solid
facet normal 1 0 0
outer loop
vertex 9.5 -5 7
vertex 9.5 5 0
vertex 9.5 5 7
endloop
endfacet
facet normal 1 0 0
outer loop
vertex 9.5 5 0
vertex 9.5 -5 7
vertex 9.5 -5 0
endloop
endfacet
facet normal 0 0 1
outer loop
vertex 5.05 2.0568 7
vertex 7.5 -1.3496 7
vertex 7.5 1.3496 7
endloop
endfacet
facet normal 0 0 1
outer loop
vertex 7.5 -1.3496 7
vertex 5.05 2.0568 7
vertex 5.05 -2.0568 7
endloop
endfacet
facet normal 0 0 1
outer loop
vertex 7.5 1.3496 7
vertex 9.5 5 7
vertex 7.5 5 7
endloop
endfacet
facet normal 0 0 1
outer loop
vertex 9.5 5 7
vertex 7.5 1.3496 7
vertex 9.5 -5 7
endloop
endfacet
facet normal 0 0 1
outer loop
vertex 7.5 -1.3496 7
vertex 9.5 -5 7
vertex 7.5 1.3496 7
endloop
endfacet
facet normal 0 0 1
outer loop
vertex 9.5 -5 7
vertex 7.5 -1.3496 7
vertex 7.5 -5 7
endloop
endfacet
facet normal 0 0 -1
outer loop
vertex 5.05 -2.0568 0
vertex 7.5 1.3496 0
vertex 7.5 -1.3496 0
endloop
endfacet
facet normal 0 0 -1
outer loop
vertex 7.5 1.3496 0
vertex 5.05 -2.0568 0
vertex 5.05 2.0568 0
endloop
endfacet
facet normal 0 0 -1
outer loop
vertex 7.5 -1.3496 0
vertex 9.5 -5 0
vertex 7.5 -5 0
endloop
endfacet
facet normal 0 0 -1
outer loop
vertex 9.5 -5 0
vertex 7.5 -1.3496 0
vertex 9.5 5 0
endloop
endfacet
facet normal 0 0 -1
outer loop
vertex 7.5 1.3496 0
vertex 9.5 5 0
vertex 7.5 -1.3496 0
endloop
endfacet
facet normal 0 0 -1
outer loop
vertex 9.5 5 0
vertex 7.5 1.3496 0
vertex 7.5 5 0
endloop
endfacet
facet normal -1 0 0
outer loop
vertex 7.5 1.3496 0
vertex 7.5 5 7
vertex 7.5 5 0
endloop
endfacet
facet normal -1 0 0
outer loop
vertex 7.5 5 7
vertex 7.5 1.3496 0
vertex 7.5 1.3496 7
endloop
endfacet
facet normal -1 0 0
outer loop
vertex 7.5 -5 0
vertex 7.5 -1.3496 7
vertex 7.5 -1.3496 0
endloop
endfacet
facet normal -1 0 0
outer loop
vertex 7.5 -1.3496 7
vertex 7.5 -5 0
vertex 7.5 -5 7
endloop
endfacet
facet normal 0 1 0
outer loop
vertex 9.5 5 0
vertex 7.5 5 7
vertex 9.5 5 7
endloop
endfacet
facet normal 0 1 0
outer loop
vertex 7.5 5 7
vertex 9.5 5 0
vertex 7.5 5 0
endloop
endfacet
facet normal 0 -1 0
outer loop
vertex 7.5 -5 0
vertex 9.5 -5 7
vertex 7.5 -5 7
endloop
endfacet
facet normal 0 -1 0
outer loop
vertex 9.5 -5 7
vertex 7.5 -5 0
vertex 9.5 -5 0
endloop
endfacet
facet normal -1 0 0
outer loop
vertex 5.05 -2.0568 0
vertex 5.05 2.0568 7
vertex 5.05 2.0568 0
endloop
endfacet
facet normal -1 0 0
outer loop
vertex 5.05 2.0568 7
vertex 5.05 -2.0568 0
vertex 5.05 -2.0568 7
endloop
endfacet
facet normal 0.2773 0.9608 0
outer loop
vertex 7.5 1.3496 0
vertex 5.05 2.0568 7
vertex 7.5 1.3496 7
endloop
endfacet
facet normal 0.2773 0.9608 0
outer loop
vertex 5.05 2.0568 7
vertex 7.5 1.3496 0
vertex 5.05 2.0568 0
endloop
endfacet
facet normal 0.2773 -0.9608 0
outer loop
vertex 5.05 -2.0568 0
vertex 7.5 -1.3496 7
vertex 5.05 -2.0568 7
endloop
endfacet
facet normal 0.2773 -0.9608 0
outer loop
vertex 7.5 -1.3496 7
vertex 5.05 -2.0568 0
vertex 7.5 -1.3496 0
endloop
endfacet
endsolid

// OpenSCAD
$fn=100;

////column
//C_H = 100;
//C_D = 5;
//
////base
//B_W = 12;
//B_H = 2;

D1 = 8;
D2 = 10;

L = 7;

// 1st part

module foo(){
        translate([D2 * 0.75,0,0]) rotate([0,0,0]) scale([1,0.5,1])  

        cylinder(d=D2, h=L, $fn=3);
}
//
////translate([0,D2/2,D2/2]) rotate([0,90,0])
//difference(){
//    union(){
//        cylinder(d=D2, h=L);
//        translate([0, -D2/2,0]) cube([D2 * 0.75, D2, L]);
//    }
//    union(){
//        cylinder(d=D1, h=L);
//        foo();
//
//    }
//}

// 2nd pART
color("red")
{
difference(){
    union(){
    translate([D2 * 0.75, -D2/2 ,0]) cube([2, D2, L]);
    translate([0.3,0,0]) scale([0.95, 0.95,1]) foo();

    }
    translate([D2 - 0.5 , -D2/2 ,0]) cube([3, D2, L]);
}
}
